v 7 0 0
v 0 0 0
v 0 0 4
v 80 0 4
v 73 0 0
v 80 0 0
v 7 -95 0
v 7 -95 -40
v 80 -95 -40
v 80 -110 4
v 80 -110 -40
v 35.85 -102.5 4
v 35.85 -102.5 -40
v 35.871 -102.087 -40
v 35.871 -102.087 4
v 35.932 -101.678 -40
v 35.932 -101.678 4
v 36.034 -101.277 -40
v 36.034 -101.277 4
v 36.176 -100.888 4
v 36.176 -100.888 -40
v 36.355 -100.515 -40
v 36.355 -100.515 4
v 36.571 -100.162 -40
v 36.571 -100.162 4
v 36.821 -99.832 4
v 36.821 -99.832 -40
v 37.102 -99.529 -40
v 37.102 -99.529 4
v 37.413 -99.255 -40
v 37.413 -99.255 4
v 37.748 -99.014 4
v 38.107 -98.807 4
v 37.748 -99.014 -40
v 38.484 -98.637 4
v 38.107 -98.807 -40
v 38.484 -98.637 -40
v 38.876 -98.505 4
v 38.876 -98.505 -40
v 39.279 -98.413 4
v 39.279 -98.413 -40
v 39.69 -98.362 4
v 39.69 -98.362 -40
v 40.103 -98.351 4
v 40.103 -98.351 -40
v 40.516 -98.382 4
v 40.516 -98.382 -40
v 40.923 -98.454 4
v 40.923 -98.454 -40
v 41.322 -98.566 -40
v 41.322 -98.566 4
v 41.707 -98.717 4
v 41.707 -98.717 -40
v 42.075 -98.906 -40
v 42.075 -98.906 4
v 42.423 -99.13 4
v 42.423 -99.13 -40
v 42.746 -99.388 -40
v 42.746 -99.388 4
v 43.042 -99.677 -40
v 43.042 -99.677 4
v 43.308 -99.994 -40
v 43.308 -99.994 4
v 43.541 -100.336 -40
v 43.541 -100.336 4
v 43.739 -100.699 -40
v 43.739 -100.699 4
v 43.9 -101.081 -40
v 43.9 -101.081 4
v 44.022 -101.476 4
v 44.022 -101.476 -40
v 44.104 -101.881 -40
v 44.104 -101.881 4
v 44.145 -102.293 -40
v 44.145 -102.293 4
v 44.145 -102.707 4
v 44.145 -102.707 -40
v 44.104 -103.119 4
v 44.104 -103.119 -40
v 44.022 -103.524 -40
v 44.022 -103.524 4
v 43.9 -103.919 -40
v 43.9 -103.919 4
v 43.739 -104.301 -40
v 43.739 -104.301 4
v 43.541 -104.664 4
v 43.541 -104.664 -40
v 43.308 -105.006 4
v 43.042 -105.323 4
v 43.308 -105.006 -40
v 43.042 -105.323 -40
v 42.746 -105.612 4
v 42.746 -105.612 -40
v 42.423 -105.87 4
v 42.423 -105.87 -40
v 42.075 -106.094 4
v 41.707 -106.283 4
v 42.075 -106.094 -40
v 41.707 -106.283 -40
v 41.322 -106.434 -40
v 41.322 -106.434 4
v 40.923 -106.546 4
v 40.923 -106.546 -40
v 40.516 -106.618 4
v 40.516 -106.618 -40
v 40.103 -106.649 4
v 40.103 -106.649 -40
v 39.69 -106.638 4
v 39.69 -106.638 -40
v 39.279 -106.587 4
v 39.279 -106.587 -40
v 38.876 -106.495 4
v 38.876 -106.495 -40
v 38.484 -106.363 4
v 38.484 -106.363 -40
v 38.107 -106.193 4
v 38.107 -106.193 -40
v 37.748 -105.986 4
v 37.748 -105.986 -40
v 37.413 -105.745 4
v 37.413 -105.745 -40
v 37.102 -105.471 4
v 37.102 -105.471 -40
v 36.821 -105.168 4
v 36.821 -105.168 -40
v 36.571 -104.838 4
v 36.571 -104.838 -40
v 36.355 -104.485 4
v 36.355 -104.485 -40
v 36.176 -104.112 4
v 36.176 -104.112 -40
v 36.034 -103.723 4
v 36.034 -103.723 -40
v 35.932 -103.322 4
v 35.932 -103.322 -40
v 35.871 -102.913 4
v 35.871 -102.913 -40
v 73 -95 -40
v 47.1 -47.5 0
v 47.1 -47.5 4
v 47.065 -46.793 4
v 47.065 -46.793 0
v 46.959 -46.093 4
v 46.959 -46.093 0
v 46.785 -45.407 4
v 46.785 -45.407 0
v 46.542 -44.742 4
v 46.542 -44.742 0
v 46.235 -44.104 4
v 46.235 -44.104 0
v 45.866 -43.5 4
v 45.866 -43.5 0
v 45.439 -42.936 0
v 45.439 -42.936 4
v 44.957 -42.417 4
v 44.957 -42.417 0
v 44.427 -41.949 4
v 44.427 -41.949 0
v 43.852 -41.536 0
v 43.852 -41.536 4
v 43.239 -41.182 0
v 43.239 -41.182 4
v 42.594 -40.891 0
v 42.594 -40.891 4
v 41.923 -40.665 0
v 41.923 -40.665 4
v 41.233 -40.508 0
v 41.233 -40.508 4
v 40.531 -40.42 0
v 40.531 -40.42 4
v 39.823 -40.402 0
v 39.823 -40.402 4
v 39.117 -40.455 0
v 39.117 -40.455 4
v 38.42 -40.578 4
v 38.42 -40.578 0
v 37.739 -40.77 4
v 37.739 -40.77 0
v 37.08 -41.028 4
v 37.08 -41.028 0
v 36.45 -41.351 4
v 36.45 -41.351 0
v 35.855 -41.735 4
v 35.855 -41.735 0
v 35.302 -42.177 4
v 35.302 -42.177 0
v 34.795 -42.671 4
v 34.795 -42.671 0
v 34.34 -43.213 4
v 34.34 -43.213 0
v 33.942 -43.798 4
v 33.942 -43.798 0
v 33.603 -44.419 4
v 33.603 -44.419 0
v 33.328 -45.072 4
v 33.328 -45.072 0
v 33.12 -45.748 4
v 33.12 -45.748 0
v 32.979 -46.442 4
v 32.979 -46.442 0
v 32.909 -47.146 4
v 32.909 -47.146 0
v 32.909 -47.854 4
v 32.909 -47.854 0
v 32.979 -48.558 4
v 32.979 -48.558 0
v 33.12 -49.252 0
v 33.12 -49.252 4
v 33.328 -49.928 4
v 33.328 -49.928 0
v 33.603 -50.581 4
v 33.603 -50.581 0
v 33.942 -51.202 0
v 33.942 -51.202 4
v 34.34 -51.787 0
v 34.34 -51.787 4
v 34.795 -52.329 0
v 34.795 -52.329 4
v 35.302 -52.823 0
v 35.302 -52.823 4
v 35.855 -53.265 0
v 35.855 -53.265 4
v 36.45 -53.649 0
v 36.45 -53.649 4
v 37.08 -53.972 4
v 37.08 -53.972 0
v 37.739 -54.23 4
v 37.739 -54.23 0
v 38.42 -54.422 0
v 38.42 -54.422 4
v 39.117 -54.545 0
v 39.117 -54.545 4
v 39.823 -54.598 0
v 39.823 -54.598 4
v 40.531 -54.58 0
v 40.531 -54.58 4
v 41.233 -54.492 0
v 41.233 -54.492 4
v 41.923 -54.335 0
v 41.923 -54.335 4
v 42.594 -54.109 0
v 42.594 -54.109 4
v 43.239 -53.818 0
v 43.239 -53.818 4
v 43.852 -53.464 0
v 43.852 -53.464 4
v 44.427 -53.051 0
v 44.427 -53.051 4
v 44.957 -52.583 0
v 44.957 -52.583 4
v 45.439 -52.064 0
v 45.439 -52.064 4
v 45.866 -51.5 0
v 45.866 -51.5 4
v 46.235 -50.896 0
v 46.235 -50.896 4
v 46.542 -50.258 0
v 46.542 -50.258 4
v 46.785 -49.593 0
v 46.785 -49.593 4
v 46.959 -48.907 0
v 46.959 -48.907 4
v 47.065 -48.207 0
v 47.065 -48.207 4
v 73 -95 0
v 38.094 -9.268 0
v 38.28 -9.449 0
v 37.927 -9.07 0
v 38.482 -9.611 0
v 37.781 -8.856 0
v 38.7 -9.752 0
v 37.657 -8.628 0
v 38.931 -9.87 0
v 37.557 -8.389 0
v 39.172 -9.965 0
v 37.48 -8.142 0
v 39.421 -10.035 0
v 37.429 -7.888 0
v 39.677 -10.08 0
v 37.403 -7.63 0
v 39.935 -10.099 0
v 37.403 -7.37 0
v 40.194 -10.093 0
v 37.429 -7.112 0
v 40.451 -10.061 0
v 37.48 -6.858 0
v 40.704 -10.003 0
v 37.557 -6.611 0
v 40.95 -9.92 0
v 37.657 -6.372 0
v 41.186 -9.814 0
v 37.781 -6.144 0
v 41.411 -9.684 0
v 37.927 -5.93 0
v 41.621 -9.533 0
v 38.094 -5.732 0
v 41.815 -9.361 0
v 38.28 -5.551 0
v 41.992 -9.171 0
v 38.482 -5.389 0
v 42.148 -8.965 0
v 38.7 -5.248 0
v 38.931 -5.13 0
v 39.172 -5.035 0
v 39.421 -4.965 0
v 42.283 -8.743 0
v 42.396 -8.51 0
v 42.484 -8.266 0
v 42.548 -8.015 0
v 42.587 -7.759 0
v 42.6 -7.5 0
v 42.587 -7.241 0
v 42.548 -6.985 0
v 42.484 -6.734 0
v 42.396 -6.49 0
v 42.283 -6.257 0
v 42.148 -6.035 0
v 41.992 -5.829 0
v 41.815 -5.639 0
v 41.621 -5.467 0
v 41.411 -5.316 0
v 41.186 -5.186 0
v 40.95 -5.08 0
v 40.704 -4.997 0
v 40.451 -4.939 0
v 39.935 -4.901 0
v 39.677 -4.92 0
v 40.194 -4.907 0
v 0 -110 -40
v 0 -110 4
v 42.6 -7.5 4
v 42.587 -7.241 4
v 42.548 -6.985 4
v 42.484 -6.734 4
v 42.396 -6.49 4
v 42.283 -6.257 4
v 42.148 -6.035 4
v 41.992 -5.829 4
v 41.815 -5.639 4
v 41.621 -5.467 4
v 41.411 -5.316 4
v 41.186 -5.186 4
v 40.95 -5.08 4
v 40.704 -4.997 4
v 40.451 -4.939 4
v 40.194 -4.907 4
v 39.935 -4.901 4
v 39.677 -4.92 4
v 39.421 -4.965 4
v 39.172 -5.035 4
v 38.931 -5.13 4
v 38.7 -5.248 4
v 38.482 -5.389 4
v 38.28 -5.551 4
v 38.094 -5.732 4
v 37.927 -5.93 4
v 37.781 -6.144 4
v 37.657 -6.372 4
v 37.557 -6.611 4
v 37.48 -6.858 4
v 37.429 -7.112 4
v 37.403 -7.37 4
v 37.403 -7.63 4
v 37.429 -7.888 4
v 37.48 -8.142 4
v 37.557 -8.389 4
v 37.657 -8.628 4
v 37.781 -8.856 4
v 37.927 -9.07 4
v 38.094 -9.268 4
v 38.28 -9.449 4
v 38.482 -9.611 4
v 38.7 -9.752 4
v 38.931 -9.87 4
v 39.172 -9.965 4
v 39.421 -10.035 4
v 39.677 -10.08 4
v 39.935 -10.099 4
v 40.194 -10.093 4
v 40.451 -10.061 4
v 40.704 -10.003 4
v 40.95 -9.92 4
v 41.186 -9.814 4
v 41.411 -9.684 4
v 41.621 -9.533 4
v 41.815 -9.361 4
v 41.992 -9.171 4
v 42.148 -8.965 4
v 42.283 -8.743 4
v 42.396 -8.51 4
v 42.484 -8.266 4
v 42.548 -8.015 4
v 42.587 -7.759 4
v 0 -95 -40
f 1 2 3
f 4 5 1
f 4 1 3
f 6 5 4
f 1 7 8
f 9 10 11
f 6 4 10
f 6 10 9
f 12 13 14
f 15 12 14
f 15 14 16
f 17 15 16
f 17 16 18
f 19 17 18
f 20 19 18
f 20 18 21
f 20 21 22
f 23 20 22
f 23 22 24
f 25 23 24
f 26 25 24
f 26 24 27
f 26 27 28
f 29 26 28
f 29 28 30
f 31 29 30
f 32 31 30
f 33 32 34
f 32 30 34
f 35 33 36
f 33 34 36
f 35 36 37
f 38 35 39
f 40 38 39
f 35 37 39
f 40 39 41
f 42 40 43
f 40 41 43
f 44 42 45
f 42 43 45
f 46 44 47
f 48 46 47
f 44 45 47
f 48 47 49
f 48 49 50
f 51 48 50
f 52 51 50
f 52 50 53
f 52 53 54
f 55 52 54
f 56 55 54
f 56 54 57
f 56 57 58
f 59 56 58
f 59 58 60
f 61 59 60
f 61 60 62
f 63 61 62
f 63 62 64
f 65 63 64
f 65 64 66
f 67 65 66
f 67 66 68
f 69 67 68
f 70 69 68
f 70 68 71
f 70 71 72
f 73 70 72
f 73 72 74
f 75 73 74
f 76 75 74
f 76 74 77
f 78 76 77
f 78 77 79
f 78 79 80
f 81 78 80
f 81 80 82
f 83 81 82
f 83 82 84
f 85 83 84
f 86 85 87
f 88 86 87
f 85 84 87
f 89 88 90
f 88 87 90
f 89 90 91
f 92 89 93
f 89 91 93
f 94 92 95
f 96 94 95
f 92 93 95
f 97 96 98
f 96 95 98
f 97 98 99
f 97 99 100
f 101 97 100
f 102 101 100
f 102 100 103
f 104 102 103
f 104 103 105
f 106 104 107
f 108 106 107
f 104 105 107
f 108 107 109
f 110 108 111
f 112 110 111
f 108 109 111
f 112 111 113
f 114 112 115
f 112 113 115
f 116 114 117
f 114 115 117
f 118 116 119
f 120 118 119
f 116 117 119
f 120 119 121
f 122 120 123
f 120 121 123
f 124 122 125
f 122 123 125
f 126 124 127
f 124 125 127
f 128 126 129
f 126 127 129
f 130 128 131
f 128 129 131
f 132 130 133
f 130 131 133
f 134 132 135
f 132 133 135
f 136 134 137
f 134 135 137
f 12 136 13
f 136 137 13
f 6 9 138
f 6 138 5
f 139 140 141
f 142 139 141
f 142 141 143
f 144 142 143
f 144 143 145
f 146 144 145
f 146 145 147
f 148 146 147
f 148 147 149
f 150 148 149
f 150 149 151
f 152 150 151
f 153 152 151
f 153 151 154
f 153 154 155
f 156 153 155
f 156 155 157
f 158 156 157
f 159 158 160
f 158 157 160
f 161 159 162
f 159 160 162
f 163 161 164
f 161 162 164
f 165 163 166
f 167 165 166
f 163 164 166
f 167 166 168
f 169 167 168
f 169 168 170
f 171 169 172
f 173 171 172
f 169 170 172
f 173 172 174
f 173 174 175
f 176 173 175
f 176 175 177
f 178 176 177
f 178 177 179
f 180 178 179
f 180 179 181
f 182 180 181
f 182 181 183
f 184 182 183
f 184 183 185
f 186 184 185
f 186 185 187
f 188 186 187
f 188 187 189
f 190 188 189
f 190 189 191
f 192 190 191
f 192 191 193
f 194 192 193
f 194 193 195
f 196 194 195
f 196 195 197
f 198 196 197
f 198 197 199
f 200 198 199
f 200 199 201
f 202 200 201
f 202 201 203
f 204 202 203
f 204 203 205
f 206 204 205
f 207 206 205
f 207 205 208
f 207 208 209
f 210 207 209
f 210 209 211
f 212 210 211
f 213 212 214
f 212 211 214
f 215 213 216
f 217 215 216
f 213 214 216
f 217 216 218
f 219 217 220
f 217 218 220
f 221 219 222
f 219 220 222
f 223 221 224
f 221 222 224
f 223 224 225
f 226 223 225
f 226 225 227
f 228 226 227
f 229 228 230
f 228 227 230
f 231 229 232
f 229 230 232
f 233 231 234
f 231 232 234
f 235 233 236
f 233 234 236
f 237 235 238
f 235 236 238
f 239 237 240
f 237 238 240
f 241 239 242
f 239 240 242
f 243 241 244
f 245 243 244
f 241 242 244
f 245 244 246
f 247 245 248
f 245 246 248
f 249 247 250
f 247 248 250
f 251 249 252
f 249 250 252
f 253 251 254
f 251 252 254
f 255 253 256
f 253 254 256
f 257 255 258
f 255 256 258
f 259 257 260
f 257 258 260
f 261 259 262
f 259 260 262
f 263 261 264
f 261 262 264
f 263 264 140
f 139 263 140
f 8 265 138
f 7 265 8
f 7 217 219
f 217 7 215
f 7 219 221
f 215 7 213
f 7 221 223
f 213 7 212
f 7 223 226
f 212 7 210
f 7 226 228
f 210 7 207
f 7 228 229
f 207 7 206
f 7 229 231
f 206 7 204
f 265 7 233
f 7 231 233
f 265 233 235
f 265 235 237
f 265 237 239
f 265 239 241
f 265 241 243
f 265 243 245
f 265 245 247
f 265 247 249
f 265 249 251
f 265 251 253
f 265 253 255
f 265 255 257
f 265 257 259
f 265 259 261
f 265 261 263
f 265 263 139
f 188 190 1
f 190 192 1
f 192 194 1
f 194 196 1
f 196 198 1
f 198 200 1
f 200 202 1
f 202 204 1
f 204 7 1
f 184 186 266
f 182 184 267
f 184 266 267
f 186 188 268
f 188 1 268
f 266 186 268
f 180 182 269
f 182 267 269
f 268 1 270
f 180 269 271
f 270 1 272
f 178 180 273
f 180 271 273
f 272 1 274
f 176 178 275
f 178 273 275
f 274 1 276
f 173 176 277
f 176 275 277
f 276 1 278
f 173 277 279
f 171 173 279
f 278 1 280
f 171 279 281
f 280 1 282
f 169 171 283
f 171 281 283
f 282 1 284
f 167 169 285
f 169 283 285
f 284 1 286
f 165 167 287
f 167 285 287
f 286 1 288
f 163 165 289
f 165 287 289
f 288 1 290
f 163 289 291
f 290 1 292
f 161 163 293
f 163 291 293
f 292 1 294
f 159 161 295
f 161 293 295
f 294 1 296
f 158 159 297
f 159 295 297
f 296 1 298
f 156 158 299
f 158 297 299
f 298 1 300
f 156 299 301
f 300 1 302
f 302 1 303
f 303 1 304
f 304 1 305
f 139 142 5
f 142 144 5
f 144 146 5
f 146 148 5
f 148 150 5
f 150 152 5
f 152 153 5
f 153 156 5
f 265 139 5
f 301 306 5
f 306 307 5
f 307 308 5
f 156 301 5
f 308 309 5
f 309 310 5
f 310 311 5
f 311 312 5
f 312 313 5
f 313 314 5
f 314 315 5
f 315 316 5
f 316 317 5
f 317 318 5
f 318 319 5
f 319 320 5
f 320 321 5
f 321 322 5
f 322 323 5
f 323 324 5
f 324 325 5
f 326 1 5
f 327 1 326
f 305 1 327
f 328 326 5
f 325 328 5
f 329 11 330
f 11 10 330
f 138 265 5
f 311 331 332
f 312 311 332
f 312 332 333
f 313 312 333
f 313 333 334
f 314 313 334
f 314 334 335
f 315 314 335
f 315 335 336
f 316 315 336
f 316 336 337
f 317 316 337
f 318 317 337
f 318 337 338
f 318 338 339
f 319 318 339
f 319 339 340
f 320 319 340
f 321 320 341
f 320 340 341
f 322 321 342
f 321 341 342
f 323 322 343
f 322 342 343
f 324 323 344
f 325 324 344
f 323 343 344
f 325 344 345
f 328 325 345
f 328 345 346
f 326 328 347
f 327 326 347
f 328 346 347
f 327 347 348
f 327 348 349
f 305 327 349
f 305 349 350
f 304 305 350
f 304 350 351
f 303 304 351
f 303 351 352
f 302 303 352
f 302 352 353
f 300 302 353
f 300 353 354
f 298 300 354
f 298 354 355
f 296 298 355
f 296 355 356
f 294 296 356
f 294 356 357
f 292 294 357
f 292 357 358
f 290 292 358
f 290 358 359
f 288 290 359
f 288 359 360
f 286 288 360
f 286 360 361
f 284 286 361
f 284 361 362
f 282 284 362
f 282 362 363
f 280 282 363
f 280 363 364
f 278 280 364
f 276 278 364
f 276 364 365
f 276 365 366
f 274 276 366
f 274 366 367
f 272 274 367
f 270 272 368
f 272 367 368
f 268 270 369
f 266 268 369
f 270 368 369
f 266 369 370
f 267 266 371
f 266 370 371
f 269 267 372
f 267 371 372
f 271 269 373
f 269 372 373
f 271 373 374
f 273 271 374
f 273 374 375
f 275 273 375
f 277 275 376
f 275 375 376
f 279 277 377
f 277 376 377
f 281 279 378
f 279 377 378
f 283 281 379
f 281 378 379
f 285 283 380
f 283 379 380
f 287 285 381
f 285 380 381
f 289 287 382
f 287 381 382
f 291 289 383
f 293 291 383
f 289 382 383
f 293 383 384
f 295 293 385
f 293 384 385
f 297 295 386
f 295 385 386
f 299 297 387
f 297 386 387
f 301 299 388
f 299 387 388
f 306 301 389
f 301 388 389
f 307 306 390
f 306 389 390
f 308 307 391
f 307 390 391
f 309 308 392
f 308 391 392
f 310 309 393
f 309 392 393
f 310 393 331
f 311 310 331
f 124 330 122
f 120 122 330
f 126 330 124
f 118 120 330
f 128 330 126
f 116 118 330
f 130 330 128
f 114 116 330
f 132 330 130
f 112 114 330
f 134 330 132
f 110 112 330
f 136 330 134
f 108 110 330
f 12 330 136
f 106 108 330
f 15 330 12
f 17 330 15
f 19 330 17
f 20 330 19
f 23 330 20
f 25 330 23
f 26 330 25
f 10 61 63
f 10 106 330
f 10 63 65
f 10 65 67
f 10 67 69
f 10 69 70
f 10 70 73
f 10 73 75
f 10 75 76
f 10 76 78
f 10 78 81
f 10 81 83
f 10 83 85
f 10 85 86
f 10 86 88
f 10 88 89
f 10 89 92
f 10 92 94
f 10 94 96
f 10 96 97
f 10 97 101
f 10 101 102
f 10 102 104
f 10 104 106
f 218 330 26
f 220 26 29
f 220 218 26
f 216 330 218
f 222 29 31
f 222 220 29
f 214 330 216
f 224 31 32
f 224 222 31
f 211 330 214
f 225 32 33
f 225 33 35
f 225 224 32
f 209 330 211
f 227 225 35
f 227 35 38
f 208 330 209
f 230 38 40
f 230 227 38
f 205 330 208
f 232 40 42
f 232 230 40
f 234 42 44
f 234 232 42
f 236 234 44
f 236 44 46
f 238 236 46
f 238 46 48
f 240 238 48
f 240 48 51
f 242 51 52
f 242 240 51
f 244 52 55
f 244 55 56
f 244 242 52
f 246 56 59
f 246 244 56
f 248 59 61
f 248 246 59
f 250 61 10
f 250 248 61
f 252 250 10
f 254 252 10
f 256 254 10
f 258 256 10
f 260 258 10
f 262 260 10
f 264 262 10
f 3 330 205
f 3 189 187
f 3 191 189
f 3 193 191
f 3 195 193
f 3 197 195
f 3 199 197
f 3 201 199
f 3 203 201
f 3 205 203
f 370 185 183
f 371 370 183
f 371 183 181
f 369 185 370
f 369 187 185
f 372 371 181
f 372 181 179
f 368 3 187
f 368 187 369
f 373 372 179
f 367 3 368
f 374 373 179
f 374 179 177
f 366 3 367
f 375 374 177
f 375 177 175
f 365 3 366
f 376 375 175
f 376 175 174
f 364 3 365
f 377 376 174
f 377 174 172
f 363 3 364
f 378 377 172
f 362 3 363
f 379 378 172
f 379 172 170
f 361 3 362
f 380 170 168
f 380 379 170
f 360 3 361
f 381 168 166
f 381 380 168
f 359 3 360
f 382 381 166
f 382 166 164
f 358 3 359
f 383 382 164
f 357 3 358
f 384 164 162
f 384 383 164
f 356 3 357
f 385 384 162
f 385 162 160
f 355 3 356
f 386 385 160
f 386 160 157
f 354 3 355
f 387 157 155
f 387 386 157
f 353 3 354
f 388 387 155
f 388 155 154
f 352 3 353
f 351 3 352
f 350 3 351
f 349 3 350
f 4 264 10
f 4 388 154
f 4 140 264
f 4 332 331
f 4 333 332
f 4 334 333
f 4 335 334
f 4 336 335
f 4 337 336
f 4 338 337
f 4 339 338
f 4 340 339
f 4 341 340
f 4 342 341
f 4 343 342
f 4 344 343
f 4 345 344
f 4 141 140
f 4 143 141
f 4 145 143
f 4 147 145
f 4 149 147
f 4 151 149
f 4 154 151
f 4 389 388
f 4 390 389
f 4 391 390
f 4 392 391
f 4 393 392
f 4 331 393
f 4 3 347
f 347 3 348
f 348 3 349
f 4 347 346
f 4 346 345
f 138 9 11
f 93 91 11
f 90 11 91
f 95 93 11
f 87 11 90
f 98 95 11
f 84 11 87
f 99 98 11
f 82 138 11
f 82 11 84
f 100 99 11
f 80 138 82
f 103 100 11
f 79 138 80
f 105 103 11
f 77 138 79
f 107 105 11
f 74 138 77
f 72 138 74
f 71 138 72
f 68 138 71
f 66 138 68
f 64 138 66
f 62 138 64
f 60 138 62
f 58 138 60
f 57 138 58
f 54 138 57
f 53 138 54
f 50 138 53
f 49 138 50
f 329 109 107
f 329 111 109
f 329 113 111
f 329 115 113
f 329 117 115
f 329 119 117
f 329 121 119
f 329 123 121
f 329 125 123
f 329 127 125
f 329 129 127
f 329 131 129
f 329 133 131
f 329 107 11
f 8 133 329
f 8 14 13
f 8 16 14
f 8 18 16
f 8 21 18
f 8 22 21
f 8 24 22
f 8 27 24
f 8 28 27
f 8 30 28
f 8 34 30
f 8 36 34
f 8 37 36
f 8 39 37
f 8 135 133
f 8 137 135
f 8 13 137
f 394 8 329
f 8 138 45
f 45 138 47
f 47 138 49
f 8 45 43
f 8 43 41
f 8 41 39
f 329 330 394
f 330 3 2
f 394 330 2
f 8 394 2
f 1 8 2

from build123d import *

# Parameters (mm, degrees)
SKETCH_1_W          = 80
SKETCH_1_H          = 110
EXTRUDE_1_DEPTH     = 4
SKETCH_2_R          = 7.1
SKETCH_2_R_2        = 2.6
CUT_EXTRUDE_1_DEPTH = 137.073509545
SKETCH_3_W          = 80
SKETCH_3_H          = 15
EXTRUDE_2_DEPTH     = 40
SKETCH_4_R          = 4.15
CUT_EXTRUDE_2_DEPTH = 143.954538228
EXTRUDE_3_DEPTH     = 7
EXTRUDE_4_DEPTH     = 7


with BuildPart() as part:
    # 草图1 → 凸台-拉伸1 (new body)
    with BuildSketch(Plane.XY):
        with Locations((40, -55)):
            Rectangle(SKETCH_1_W, SKETCH_1_H)
    extrude(amount=EXTRUDE_1_DEPTH)

    # 草图2 → 切除-拉伸1 (cut, through all)
    with BuildSketch(Plane.XY.offset(4)):
        with Locations((40, -47.5)):
            Circle(SKETCH_2_R)
        with Locations((40, -7.5)):
            Circle(SKETCH_2_R_2)
    extrude(amount=-CUT_EXTRUDE_1_DEPTH, mode=Mode.SUBTRACT)

    # 草图3 → 凸台-拉伸2 (add)
    with BuildSketch(Plane(origin=(0, 0, 0), x_dir=(-1, 0, 0), z_dir=(0, 0, -1))):
        with Locations((-40, -102.5)):
            Rectangle(SKETCH_3_W, SKETCH_3_H)
    extrude(amount=EXTRUDE_2_DEPTH)

    # 草图4 → 切除-拉伸2 (cut, through all)
    with BuildSketch(Plane(origin=(0, 0, -40), x_dir=(-1, 0, 0), z_dir=(0, 0, -1))):
        with Locations((-40, -102.5)):
            Circle(SKETCH_4_R)
    extrude(amount=-CUT_EXTRUDE_2_DEPTH, mode=Mode.SUBTRACT)

    # 草图5 → 凸台-拉伸3 (add)
    with BuildSketch(Plane(origin=(80, 0, 0), x_dir=(0, 0, -1), z_dir=(1, 0, 0))):
        Polygon((0, 0), (0, -95), (40, -95), align=None)
    extrude(amount=-EXTRUDE_3_DEPTH)

    # 草图6 → 凸台-拉伸4 (add)
    with BuildSketch(Plane.ZY):
        Polygon((0, 0), (0, -95), (-40, -95), align=None)
    extrude(amount=-EXTRUDE_4_DEPTH)


solid = part.part
